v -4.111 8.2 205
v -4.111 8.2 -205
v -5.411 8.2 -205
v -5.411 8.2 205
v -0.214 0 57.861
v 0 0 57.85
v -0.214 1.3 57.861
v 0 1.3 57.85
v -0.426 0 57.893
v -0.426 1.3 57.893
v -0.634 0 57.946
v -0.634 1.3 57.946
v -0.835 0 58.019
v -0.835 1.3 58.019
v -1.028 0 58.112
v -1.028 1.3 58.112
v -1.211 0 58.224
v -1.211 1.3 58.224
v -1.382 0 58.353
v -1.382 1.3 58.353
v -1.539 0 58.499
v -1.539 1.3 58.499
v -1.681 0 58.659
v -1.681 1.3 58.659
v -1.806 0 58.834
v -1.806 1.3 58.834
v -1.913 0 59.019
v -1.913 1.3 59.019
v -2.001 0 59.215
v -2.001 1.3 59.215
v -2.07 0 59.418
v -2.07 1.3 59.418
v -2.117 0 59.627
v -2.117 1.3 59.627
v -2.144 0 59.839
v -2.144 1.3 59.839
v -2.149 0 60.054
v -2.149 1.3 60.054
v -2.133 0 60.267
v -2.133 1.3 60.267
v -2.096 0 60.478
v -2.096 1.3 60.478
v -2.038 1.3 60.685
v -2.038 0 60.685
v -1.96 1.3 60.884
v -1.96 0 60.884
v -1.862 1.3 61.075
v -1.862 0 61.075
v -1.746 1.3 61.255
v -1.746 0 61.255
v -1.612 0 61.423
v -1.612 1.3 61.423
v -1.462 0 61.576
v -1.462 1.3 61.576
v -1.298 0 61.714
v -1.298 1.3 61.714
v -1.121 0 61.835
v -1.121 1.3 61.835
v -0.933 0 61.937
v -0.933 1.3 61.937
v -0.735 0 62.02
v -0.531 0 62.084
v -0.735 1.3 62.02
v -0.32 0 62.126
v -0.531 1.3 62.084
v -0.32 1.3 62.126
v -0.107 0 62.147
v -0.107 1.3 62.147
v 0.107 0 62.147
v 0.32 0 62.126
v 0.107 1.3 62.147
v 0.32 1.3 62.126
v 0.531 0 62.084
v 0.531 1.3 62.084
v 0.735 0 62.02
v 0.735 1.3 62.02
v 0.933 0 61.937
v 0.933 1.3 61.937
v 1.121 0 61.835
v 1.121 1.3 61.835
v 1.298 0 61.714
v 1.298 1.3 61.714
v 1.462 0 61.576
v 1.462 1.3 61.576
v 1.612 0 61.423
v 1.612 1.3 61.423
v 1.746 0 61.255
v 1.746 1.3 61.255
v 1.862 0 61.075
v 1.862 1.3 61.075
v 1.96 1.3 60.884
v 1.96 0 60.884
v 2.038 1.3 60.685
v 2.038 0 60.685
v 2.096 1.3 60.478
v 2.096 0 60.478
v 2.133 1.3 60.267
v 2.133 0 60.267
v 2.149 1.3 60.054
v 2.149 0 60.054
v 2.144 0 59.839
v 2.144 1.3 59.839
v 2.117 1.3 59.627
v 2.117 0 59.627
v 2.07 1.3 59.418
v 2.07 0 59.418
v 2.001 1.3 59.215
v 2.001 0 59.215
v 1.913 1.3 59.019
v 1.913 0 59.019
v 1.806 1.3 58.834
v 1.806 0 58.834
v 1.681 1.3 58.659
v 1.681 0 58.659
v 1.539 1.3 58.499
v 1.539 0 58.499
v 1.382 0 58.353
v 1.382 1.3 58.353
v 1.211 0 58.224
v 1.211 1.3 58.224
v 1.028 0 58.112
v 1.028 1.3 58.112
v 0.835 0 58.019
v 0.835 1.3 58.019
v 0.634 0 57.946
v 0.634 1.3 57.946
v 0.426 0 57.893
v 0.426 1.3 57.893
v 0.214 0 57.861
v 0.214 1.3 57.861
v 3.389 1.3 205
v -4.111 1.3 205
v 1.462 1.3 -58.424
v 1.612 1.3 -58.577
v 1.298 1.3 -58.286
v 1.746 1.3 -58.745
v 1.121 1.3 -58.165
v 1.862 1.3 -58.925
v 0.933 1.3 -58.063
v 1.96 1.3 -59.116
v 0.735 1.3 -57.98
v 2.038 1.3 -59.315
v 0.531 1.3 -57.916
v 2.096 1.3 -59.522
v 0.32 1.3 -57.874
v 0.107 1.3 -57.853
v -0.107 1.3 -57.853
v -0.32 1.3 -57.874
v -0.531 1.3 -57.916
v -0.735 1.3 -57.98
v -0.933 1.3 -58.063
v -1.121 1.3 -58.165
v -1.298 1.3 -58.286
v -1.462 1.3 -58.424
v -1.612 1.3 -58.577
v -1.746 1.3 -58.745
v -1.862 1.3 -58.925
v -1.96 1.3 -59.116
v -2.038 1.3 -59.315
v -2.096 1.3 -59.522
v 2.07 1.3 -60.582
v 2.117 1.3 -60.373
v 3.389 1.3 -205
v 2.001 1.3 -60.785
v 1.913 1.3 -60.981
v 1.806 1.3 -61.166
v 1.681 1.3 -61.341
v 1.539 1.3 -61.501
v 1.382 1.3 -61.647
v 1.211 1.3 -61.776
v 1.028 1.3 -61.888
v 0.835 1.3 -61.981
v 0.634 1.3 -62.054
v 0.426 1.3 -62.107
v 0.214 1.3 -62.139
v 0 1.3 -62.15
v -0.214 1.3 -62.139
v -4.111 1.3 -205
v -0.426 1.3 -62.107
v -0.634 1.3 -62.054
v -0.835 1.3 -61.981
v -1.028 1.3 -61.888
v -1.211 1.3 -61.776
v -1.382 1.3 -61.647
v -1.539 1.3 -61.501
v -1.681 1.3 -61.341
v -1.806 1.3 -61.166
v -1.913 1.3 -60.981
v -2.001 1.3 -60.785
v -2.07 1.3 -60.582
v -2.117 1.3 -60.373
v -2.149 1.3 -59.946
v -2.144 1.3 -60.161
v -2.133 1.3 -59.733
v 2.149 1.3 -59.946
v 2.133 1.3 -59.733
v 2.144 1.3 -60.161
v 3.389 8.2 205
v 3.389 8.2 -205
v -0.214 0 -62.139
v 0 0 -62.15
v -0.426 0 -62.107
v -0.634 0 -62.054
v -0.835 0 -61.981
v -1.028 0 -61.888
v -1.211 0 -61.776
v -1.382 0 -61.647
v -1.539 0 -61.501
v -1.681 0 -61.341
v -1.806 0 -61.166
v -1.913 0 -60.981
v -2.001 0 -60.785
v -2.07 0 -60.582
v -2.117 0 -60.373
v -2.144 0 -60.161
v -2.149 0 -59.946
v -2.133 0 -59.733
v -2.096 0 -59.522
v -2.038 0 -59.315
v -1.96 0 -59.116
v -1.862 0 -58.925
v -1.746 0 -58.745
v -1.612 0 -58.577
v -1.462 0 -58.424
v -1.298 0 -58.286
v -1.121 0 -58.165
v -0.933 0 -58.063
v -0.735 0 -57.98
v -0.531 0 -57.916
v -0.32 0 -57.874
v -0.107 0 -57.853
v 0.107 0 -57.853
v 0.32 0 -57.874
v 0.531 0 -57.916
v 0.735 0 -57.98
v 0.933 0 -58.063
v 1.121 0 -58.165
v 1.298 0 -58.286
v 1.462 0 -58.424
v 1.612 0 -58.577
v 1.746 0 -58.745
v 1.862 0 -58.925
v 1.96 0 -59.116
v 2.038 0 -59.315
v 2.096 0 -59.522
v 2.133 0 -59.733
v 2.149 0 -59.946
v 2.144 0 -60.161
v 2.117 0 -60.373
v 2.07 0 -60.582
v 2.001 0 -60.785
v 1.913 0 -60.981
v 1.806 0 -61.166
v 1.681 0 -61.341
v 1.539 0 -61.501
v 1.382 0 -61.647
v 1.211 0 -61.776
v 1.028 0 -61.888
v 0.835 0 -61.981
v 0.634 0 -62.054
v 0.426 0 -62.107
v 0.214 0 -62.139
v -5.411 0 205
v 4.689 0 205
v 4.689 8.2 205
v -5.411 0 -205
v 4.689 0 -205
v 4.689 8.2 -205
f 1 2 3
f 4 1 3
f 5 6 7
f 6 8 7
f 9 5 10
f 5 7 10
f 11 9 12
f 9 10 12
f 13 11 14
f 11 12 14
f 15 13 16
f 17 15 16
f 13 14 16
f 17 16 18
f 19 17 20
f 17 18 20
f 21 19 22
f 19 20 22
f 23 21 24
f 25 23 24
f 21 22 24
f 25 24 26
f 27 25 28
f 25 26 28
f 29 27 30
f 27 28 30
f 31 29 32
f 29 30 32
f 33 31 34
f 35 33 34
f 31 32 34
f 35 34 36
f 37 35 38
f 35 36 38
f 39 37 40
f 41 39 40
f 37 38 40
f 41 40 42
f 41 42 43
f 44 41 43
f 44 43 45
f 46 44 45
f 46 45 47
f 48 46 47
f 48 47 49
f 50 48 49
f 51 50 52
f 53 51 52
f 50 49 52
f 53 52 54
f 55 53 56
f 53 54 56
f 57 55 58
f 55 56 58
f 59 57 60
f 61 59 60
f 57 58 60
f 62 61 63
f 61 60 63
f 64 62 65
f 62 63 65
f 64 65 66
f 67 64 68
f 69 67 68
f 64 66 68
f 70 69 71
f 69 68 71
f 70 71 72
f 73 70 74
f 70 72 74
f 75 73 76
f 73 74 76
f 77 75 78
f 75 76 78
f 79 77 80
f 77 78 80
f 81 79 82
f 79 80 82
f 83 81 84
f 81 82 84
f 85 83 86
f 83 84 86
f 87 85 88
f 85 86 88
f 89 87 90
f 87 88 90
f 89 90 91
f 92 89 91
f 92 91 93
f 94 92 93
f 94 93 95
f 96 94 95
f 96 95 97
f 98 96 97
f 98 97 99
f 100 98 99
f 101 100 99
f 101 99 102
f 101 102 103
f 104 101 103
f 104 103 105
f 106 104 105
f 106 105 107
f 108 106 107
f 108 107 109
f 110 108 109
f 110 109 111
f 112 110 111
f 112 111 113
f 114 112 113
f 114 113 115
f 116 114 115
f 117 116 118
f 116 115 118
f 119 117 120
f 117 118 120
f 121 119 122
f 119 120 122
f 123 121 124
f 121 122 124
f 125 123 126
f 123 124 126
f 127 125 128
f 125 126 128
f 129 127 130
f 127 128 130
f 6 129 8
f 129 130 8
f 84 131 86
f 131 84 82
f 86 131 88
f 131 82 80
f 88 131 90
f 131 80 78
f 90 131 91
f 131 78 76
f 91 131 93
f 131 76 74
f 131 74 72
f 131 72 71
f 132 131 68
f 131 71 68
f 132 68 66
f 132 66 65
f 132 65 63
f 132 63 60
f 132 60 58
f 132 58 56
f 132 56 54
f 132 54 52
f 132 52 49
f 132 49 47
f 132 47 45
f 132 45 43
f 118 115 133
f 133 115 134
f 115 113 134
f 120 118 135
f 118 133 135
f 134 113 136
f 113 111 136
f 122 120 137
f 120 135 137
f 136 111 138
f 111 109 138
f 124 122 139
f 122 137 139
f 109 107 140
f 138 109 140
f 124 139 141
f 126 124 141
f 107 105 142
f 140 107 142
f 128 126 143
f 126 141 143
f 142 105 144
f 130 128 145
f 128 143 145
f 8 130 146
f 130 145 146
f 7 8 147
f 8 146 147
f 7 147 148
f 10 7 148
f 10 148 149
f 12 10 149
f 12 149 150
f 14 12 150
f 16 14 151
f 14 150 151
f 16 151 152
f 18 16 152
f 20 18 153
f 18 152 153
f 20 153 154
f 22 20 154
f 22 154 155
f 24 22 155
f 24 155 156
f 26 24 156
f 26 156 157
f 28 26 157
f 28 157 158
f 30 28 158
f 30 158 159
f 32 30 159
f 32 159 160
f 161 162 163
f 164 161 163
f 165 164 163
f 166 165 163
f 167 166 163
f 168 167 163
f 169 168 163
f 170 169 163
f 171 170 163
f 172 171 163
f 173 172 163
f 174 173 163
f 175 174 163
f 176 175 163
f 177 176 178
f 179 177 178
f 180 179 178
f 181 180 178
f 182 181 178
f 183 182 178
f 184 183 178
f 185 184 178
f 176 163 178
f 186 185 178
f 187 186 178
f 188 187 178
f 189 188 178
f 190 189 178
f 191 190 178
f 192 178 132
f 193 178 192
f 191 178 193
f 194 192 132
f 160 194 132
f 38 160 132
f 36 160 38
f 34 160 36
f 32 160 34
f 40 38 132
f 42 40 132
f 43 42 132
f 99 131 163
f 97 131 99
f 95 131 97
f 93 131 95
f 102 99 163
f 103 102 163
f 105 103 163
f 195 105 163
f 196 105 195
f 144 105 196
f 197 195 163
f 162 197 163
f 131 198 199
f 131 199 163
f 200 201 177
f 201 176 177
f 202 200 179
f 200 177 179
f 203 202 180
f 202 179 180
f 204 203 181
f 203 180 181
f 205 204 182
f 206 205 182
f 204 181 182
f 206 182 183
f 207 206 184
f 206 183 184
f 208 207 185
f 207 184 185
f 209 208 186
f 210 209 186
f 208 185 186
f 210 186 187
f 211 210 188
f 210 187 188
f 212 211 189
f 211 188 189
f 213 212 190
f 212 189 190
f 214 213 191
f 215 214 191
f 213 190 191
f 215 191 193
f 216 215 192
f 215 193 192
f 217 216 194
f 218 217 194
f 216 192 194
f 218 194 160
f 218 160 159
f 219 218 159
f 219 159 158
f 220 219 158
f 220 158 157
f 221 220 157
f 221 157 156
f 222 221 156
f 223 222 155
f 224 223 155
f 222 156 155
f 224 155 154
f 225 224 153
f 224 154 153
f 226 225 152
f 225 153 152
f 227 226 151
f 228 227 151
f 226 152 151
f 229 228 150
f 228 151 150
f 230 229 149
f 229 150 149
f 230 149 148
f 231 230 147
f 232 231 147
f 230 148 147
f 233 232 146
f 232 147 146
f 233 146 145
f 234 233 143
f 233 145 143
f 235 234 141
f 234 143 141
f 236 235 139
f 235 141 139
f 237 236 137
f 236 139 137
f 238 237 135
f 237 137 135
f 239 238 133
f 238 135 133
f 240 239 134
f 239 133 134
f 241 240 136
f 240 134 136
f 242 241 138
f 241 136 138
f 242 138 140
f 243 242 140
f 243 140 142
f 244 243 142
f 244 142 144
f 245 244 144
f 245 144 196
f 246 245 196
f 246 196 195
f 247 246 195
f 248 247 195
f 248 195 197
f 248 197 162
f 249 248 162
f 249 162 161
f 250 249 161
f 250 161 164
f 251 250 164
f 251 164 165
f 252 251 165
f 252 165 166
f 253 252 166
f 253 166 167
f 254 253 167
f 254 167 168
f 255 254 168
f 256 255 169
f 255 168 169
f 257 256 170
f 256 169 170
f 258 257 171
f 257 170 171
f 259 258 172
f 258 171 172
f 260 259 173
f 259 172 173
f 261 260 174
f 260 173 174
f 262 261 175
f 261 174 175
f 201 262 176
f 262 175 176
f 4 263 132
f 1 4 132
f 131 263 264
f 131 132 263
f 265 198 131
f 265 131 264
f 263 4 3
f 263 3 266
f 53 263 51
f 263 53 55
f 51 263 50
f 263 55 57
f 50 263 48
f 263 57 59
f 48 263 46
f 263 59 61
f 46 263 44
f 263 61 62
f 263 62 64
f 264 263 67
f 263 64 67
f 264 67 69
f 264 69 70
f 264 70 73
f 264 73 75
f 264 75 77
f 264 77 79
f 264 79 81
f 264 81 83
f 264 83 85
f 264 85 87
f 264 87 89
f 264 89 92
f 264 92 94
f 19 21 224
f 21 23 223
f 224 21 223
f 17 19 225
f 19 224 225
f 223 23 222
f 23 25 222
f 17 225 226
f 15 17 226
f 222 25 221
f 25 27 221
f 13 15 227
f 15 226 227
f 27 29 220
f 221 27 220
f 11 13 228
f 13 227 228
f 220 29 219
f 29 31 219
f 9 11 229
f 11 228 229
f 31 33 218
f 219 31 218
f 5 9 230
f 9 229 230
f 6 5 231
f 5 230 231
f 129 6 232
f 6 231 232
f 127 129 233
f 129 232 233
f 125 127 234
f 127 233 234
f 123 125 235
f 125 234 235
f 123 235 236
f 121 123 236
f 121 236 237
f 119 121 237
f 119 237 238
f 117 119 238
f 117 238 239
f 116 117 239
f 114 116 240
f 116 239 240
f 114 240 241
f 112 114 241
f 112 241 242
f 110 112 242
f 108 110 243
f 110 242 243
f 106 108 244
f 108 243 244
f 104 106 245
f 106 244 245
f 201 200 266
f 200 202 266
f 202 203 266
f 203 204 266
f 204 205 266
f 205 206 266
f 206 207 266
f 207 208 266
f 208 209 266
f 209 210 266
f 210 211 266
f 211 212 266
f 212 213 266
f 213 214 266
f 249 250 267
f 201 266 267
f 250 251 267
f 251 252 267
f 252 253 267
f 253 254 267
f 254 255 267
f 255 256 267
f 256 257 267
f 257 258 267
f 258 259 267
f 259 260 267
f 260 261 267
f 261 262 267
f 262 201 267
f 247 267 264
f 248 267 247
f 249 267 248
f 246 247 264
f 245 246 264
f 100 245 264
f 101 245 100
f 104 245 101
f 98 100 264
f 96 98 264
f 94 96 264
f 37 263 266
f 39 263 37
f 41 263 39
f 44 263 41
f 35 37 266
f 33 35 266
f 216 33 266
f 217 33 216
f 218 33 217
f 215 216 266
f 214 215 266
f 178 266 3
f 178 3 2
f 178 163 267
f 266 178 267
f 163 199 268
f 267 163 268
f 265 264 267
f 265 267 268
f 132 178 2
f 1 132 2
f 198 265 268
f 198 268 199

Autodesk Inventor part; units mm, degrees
ref_plane "YZ Plane" through (0, 0, 0) normal (1, 0, 0) x (0, 1, 0)
ref_plane "XZ Plane" through (0, 0, 0) normal (0, 1, 0) x (-1, 0, 0)
ref_plane "XY Plane" through (0, 0, 0) normal (0, 0, 1) x (1, 0, 0)
sketch "Skizze1" plane through (0, 0, 0) normal (0, 0, 1) x (1, 0, 0)
  line L0 (0, 0) -> (4.6893, 0)
  line L1 (4.6893, 0) -> (4.6893, 8.2)
  line L2 (4.6893, 8.2) -> (3.3893, 8.2)
  line L3 (3.3893, 8.2) -> (3.3893, 1.3)
  line L4 (3.3893, 1.3) -> (-4.1107, 1.3)
  line L5 (-4.1107, 1.3) -> (-4.1107, 8.2)
  line L6 (-4.1107, 8.2) -> (-5.4107, 8.2)
  line L7 (-5.4107, 8.2) -> (-5.4107, 0)
  line L8 (-5.4107, 0) -> (0, 0)
  line L9 (0, 8.5935) -> (0, -2.965) construction
  dimension "d0" = 10.1
  dimension "d2" = 8.2
  dimension "d3" = 8.2
  dimension "d4" = 1.3
  dimension "d5" = 1.3
  dimension "d6" = 1.3
extrude "Extrusion1" add sketch "Skizze1" along normal mid plane 410
sketch "Skizze2" plane through (-5.4107, 0, 205) normal (0, -1, 0) x (1, 0, 0)
  point P0 (5.4107, -205)
  point P1 (5.4107, -145)
  point P2 (5.4107, -265)
  dimension "d9" = 60
  dimension "d10" = 60
  dimension "d11" = 0
  dimension "d12" = 0
hole "Bohrung1" at (0, 0, 60) at (0, 0, -60) direction (0, 1, 0) diameter 4.3 end through all
properties part number "stab"
